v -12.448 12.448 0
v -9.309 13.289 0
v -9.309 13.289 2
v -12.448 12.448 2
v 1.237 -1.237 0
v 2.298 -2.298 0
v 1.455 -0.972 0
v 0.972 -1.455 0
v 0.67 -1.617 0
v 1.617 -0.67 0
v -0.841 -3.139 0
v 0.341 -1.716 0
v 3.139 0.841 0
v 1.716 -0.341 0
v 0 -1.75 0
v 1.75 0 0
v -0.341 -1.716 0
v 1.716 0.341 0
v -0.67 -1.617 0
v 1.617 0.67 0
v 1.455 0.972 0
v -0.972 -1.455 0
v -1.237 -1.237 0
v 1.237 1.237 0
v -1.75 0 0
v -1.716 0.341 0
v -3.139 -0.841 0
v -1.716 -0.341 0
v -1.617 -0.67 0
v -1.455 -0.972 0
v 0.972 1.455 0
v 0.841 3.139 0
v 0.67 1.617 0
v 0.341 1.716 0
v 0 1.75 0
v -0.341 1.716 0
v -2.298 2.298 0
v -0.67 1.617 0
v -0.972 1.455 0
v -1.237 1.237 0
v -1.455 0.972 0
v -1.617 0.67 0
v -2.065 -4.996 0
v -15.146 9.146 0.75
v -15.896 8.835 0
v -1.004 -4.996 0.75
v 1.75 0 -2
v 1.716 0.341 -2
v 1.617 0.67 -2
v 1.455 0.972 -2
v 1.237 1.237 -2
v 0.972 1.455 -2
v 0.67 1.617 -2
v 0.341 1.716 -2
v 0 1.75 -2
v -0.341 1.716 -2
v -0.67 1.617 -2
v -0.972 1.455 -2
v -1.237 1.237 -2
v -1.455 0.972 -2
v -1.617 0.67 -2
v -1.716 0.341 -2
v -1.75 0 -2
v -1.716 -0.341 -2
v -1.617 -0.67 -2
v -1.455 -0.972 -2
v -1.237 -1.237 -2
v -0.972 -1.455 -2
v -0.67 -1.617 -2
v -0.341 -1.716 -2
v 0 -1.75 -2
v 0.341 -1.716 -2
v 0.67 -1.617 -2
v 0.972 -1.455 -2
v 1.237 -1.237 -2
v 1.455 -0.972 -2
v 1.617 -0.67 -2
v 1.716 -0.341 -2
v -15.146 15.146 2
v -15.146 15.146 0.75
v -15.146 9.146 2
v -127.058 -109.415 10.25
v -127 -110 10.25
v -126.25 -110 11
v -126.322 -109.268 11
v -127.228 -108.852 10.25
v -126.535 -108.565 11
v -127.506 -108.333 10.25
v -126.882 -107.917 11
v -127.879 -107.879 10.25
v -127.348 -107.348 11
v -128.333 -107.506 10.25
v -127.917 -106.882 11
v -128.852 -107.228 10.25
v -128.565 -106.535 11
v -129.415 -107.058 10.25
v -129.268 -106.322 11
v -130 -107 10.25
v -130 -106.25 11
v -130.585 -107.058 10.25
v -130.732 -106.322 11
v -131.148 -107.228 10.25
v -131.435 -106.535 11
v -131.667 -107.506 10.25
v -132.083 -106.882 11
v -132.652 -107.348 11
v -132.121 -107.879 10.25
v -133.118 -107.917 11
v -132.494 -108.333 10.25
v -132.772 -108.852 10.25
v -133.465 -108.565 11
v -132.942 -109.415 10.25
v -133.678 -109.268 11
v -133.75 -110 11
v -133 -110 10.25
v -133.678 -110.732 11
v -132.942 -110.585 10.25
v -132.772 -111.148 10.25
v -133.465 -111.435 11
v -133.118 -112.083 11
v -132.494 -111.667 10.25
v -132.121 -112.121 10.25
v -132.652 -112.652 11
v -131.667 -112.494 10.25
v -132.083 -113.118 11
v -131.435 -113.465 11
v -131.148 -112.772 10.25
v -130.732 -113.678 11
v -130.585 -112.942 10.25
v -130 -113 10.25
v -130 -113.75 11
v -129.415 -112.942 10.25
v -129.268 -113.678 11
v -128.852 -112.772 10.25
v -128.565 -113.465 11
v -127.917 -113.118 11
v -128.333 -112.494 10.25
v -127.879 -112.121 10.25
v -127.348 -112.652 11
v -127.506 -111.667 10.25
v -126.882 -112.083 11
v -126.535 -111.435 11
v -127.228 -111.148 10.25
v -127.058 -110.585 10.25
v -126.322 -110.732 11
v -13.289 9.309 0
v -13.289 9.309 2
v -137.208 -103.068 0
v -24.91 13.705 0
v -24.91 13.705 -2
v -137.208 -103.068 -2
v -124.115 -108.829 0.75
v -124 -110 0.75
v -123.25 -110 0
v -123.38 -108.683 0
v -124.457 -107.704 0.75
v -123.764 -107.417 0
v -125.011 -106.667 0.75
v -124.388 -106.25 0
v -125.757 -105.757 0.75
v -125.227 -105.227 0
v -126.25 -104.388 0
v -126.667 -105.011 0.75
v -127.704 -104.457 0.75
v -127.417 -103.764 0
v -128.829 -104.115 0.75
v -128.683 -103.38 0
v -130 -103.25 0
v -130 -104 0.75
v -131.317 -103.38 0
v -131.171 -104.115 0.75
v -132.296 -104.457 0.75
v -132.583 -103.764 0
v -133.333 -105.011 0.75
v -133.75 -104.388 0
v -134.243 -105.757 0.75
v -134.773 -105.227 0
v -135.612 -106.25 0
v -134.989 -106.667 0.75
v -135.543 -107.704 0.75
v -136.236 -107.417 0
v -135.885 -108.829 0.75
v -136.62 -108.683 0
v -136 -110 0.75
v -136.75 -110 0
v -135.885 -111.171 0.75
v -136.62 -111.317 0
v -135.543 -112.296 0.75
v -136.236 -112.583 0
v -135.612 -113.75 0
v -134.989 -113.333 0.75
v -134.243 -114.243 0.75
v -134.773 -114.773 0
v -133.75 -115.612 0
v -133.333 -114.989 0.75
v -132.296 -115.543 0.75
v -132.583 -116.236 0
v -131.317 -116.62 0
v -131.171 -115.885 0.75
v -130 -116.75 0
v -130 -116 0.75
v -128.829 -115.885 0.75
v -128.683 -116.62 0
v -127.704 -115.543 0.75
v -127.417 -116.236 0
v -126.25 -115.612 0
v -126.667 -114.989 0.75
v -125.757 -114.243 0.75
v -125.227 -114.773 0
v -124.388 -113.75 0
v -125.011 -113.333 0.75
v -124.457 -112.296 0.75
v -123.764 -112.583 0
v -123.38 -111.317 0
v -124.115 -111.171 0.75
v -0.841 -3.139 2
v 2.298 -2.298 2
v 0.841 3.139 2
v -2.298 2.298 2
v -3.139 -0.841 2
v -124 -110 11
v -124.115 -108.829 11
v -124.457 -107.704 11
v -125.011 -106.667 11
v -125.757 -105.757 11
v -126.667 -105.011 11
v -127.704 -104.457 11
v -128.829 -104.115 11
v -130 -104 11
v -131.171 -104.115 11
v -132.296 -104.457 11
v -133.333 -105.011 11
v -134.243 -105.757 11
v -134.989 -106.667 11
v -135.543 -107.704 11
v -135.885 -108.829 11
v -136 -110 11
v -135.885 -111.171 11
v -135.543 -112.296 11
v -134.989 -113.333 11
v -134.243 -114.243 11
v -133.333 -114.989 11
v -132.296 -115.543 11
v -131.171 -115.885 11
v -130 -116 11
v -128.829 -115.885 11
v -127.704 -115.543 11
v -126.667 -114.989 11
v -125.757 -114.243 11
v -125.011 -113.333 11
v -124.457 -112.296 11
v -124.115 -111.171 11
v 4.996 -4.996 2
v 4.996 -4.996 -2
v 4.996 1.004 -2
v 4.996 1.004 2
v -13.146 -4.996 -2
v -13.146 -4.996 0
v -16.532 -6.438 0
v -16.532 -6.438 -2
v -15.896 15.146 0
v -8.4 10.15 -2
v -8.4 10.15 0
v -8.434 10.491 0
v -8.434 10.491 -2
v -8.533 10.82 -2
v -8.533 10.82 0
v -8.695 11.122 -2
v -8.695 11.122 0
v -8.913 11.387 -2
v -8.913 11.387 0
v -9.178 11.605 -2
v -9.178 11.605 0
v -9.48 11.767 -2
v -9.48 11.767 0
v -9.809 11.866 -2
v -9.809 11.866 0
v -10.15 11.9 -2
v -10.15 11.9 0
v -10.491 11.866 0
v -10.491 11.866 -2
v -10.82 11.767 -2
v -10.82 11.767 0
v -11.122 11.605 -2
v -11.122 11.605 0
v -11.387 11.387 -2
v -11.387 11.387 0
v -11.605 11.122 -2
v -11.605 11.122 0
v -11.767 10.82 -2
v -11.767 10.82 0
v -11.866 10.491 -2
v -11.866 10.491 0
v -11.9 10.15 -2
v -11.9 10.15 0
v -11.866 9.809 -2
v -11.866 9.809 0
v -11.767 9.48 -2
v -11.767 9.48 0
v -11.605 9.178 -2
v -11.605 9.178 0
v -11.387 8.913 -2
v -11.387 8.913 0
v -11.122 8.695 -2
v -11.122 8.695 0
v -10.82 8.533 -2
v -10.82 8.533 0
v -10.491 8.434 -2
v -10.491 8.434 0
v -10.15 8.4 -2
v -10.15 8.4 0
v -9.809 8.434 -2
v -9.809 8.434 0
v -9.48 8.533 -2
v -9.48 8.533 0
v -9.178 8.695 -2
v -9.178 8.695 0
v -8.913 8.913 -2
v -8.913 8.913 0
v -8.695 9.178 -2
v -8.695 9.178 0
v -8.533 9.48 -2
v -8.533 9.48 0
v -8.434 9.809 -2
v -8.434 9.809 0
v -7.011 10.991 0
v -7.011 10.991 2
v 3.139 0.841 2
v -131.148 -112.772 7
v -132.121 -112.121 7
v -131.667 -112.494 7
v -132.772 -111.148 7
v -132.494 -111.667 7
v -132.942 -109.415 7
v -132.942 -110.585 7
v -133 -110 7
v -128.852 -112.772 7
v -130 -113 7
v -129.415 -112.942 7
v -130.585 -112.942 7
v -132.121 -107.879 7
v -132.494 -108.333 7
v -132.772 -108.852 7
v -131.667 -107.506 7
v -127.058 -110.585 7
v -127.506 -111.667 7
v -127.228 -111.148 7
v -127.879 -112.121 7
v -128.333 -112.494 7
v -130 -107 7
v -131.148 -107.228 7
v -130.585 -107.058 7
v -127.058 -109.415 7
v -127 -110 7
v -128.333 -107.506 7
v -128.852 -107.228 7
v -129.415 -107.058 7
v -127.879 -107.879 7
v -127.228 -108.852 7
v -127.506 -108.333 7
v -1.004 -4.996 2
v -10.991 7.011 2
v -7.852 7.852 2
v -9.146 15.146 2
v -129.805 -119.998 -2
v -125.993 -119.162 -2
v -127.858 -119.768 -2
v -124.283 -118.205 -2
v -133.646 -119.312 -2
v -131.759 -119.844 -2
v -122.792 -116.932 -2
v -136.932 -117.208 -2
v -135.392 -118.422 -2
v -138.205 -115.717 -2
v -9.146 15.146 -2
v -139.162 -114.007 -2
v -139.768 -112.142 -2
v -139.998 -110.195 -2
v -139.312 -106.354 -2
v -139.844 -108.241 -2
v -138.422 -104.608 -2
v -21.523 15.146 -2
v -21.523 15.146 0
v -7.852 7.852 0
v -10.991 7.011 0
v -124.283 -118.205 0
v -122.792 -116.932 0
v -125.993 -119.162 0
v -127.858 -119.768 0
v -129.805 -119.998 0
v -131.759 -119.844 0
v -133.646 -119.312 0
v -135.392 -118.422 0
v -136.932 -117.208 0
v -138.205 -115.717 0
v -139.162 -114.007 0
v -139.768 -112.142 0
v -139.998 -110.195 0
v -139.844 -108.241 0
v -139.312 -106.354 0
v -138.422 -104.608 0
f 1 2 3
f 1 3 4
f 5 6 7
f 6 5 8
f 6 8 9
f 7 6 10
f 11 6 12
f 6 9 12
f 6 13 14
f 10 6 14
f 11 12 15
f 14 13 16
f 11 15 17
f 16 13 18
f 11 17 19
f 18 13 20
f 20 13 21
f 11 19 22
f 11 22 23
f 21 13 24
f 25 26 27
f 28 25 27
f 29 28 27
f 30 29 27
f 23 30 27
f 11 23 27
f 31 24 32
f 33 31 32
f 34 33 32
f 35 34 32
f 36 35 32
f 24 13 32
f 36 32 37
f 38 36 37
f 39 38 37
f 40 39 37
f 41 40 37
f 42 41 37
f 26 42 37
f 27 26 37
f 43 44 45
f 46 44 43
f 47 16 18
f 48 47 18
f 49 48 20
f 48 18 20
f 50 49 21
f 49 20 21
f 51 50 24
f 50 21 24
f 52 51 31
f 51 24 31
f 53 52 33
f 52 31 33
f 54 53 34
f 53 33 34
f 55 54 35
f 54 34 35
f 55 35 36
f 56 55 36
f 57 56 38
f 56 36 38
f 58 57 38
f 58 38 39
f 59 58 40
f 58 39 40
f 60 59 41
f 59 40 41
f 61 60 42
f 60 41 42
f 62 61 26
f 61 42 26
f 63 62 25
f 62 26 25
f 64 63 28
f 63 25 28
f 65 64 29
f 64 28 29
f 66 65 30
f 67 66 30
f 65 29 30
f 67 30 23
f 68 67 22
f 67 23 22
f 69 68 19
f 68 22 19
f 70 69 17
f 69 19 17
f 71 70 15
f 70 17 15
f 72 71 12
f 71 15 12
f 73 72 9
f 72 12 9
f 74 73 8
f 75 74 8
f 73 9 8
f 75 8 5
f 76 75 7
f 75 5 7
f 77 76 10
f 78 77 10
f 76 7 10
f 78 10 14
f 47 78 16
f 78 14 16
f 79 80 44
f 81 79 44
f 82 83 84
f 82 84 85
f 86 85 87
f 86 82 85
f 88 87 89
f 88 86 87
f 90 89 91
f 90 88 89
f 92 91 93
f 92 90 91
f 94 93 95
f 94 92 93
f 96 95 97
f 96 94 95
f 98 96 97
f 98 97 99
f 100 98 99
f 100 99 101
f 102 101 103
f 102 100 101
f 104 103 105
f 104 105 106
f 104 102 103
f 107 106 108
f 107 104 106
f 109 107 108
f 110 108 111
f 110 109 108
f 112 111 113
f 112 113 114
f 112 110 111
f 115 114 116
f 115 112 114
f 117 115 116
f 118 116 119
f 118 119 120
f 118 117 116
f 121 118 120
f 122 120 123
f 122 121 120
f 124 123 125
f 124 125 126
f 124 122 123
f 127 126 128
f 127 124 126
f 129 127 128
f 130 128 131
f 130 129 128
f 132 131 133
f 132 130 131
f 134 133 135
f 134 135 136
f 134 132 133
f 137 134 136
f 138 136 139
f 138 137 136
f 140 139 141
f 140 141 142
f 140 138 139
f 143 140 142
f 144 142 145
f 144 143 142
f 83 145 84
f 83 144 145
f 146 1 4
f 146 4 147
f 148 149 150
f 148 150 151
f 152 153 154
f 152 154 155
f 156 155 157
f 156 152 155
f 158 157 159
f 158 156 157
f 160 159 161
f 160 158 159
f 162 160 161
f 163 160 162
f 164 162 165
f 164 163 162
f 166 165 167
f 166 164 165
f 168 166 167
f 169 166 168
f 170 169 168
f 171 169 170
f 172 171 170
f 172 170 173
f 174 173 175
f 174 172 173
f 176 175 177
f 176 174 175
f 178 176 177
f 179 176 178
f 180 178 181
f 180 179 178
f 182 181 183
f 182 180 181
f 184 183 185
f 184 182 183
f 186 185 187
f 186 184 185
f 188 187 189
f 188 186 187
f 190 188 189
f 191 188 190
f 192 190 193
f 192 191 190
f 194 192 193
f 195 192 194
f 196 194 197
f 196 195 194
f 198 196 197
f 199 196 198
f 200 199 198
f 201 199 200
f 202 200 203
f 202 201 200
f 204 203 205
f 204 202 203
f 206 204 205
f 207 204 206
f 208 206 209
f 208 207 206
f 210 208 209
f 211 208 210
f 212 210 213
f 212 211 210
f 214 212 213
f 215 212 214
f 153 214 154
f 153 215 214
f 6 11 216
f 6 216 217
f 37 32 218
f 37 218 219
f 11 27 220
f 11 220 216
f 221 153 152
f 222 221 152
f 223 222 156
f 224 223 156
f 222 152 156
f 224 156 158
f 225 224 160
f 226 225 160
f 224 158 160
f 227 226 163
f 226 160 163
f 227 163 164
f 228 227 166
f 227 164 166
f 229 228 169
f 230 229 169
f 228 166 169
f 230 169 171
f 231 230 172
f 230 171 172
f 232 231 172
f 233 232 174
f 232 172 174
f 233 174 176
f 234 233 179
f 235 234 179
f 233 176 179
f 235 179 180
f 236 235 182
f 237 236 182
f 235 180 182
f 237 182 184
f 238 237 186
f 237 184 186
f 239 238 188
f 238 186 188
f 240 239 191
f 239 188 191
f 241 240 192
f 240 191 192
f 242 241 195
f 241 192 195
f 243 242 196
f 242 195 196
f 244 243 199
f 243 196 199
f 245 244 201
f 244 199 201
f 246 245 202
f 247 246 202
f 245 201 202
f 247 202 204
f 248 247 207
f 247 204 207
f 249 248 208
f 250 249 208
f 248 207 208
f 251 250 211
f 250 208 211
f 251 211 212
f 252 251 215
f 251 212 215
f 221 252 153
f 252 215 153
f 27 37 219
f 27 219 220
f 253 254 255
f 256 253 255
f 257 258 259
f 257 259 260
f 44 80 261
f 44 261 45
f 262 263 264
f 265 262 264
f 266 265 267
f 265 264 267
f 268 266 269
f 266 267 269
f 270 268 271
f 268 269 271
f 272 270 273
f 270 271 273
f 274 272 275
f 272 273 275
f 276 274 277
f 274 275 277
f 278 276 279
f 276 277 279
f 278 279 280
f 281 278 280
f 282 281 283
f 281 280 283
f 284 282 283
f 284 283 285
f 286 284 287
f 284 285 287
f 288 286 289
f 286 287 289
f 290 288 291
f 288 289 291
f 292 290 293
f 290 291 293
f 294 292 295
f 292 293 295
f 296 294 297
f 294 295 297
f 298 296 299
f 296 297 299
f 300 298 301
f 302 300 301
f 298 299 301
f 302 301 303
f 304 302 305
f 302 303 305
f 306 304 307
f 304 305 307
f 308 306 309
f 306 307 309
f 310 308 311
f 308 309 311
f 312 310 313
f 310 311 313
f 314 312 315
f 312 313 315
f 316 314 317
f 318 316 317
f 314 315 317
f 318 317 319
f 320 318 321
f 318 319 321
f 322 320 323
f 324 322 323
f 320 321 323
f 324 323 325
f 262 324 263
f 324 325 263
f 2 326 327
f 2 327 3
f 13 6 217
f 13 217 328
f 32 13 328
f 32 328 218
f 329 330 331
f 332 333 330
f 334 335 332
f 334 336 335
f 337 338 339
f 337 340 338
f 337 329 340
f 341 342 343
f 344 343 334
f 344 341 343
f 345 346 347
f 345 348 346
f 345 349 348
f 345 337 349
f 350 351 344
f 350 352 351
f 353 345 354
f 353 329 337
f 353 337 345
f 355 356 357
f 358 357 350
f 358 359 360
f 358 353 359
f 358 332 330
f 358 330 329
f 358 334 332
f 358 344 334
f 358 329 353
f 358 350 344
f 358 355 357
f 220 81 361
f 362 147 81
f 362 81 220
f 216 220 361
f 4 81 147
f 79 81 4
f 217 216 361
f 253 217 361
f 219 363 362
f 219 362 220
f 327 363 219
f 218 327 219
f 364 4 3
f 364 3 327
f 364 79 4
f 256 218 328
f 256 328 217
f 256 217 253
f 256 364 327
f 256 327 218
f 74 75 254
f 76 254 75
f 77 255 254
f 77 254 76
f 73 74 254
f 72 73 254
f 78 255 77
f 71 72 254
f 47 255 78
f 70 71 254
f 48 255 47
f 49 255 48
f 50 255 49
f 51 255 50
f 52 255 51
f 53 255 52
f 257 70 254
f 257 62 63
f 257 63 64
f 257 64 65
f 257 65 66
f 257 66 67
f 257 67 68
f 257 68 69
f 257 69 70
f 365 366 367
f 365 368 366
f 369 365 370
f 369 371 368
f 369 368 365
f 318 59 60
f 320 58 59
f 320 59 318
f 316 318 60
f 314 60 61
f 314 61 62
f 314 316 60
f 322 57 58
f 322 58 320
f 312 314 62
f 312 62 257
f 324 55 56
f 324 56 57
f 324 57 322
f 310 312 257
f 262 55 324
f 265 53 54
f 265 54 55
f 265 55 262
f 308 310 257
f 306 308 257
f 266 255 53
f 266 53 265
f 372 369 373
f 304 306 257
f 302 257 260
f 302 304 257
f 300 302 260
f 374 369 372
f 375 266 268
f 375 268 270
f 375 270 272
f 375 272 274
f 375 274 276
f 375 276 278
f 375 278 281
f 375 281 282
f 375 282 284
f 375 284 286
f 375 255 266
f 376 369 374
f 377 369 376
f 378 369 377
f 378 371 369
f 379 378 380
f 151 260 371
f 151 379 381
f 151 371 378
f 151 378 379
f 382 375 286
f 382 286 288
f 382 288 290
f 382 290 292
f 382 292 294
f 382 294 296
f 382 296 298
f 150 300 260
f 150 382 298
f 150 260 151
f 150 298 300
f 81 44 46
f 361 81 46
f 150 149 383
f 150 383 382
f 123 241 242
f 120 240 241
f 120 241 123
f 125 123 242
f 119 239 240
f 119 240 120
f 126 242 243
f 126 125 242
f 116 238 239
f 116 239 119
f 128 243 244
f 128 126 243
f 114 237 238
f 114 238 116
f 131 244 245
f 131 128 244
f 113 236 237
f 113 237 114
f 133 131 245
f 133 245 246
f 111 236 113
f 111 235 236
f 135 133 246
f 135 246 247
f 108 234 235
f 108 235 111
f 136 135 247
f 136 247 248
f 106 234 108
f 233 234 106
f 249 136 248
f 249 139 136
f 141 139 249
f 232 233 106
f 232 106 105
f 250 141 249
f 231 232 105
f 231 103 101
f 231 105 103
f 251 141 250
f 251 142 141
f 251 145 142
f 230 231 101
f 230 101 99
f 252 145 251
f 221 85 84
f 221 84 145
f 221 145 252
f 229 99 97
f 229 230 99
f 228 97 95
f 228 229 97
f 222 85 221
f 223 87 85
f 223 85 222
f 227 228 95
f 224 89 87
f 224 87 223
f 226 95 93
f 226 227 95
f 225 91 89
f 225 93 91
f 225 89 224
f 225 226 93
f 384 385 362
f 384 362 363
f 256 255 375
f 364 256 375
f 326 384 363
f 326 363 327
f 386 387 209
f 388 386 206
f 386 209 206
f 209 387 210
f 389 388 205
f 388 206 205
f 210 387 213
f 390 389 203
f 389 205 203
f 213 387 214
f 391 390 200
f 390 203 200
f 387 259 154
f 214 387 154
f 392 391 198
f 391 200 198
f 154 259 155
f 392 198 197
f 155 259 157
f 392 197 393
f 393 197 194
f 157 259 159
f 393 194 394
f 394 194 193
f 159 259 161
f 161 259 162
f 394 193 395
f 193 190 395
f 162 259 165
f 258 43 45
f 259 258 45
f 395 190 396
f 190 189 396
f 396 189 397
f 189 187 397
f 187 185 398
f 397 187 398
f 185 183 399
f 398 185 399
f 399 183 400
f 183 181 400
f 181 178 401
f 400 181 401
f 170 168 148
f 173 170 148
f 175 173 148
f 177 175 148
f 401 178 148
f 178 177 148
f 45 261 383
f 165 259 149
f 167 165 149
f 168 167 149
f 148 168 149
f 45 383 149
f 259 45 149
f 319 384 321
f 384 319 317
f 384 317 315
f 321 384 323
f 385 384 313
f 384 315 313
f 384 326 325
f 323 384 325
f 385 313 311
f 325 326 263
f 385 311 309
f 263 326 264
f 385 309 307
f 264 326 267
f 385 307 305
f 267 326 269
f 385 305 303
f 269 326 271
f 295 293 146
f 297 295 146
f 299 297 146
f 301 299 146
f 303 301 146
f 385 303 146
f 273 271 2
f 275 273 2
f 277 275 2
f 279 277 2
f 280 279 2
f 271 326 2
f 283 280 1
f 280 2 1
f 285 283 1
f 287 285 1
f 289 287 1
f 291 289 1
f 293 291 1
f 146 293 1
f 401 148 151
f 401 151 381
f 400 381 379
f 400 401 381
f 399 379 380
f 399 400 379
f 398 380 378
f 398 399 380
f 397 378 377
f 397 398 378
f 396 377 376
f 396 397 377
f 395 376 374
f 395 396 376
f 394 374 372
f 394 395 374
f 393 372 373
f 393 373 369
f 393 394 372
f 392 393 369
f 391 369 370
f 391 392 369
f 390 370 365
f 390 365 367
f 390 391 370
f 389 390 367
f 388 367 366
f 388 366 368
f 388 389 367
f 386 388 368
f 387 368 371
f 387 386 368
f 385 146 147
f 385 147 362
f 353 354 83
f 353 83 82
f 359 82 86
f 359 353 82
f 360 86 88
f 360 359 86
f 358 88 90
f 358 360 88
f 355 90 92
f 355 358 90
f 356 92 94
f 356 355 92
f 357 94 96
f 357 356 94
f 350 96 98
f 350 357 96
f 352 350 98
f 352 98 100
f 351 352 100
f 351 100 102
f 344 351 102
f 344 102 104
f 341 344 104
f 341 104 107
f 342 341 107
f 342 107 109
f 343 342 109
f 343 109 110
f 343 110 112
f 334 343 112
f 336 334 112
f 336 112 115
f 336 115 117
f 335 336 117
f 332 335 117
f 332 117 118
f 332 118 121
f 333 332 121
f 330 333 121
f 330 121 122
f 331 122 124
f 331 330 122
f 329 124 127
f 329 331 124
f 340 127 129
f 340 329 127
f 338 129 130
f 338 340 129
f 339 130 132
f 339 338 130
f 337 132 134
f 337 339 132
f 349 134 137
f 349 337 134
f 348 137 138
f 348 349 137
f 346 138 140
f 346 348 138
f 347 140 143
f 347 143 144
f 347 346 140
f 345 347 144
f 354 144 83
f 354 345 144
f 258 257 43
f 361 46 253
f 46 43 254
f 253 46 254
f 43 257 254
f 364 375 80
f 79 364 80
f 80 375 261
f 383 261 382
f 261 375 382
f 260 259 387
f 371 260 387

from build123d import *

# Parameters (mm, degrees)
SKETCH_R        = 1.75
PAD_DEPTH       = 2
PAD001_DEPTH    = 2
SKETCH002_R     = 3.25
PAD002_DEPTH    = 7
SKETCH003_R     = 6
SKETCH003_R_2   = 3
PAD003_DEPTH    = 11
CHAMFER_SIZE    = 2
CHAMFER001_SIZE = 0.75


with BuildPart() as part:
    # Sketch → Pad (new body)
    with BuildSketch(Plane.XY):
        with BuildLine():
            Line((-15.146068, 15.146068), (-9.146068, 15.146068))
            Line((-9.146068, 15.146068), (4.996068, 1.003932))
            Line((4.996068, 1.003932), (4.996068, -4.996068))
            Line((4.996068, -4.996068), (-15.146068, -4.996068))
            Line((-15.146068, -4.996068), (-122.792176, -116.931614))
            ThreePointArc((-137.207846, -103.068409), (-136.931603, -117.207835), (-122.792176, -116.931614))
            Line((-23.52342, 15.146068), (-137.207846, -103.068409))
            Line((-15.146068, 15.146068), (-23.52342, 15.146068))
        make_face()
        Circle(SKETCH_R, mode=Mode.SUBTRACT)
        with Locations((-10.15, 10.15)):
            Circle(SKETCH_R, mode=Mode.SUBTRACT)
    extrude(amount=-PAD_DEPTH)

    # Sketch001 → Pad001 (join)
    with BuildSketch(Plane.XY):
        Polygon((-9.146068, 15.146068), (-15.146068, 15.146068), (-15.146068, 9.146068), (-1.003932, -4.996068), (4.996068, -4.996068), (4.996068, 1.003932), align=None)
        Polygon((-0.841162, -3.139259), (2.298097, -2.298097), (3.139259, 0.841162), (0.841162, 3.139259), (-2.298097, 2.298097), (-3.139259, -0.841162), align=None, mode=Mode.SUBTRACT)
        Polygon((-7.851903, 7.851903), (-7.010741, 10.991162), (-9.308838, 13.289259), (-12.448097, 12.448097), (-13.289259, 9.308838), (-10.991162, 7.010741), align=None, mode=Mode.SUBTRACT)
    extrude(amount=PAD001_DEPTH)

    # Sketch002 → Pad002 (join)
    with BuildSketch(Plane.XY):
        with Locations((-130, -110)):
            Circle(SKETCH002_R)
    extrude(amount=PAD002_DEPTH)

    # Sketch003 → Pad003 (join)
    with BuildSketch(Plane.XY):
        with Locations((-130, -110)):
            Circle(SKETCH003_R)
        with Locations((-130, -110)):
            Circle(SKETCH003_R_2, mode=Mode.SUBTRACT)
    extrude(amount=PAD003_DEPTH)

    # Chamfer
    chamfer_edges = [part.edges().sort_by_distance(p)[0] for p in [
        (-15.146068, -4.996068, -1),
        (-23.52342, 15.146068, -1),
    ]]
    chamfer(chamfer_edges, length=CHAMFER_SIZE)

    # Chamfer001
    chamfer001_edges = [part.edges().sort_by_distance(p)[0] for p in [
        (-133, -110, 11),
        (-136, -110, 0),
        (-8.075, 2.075, 0),
        (-15.146068, 12.146068, 0),
    ]]
    chamfer(chamfer001_edges, length=CHAMFER001_SIZE)


solid = part.part
